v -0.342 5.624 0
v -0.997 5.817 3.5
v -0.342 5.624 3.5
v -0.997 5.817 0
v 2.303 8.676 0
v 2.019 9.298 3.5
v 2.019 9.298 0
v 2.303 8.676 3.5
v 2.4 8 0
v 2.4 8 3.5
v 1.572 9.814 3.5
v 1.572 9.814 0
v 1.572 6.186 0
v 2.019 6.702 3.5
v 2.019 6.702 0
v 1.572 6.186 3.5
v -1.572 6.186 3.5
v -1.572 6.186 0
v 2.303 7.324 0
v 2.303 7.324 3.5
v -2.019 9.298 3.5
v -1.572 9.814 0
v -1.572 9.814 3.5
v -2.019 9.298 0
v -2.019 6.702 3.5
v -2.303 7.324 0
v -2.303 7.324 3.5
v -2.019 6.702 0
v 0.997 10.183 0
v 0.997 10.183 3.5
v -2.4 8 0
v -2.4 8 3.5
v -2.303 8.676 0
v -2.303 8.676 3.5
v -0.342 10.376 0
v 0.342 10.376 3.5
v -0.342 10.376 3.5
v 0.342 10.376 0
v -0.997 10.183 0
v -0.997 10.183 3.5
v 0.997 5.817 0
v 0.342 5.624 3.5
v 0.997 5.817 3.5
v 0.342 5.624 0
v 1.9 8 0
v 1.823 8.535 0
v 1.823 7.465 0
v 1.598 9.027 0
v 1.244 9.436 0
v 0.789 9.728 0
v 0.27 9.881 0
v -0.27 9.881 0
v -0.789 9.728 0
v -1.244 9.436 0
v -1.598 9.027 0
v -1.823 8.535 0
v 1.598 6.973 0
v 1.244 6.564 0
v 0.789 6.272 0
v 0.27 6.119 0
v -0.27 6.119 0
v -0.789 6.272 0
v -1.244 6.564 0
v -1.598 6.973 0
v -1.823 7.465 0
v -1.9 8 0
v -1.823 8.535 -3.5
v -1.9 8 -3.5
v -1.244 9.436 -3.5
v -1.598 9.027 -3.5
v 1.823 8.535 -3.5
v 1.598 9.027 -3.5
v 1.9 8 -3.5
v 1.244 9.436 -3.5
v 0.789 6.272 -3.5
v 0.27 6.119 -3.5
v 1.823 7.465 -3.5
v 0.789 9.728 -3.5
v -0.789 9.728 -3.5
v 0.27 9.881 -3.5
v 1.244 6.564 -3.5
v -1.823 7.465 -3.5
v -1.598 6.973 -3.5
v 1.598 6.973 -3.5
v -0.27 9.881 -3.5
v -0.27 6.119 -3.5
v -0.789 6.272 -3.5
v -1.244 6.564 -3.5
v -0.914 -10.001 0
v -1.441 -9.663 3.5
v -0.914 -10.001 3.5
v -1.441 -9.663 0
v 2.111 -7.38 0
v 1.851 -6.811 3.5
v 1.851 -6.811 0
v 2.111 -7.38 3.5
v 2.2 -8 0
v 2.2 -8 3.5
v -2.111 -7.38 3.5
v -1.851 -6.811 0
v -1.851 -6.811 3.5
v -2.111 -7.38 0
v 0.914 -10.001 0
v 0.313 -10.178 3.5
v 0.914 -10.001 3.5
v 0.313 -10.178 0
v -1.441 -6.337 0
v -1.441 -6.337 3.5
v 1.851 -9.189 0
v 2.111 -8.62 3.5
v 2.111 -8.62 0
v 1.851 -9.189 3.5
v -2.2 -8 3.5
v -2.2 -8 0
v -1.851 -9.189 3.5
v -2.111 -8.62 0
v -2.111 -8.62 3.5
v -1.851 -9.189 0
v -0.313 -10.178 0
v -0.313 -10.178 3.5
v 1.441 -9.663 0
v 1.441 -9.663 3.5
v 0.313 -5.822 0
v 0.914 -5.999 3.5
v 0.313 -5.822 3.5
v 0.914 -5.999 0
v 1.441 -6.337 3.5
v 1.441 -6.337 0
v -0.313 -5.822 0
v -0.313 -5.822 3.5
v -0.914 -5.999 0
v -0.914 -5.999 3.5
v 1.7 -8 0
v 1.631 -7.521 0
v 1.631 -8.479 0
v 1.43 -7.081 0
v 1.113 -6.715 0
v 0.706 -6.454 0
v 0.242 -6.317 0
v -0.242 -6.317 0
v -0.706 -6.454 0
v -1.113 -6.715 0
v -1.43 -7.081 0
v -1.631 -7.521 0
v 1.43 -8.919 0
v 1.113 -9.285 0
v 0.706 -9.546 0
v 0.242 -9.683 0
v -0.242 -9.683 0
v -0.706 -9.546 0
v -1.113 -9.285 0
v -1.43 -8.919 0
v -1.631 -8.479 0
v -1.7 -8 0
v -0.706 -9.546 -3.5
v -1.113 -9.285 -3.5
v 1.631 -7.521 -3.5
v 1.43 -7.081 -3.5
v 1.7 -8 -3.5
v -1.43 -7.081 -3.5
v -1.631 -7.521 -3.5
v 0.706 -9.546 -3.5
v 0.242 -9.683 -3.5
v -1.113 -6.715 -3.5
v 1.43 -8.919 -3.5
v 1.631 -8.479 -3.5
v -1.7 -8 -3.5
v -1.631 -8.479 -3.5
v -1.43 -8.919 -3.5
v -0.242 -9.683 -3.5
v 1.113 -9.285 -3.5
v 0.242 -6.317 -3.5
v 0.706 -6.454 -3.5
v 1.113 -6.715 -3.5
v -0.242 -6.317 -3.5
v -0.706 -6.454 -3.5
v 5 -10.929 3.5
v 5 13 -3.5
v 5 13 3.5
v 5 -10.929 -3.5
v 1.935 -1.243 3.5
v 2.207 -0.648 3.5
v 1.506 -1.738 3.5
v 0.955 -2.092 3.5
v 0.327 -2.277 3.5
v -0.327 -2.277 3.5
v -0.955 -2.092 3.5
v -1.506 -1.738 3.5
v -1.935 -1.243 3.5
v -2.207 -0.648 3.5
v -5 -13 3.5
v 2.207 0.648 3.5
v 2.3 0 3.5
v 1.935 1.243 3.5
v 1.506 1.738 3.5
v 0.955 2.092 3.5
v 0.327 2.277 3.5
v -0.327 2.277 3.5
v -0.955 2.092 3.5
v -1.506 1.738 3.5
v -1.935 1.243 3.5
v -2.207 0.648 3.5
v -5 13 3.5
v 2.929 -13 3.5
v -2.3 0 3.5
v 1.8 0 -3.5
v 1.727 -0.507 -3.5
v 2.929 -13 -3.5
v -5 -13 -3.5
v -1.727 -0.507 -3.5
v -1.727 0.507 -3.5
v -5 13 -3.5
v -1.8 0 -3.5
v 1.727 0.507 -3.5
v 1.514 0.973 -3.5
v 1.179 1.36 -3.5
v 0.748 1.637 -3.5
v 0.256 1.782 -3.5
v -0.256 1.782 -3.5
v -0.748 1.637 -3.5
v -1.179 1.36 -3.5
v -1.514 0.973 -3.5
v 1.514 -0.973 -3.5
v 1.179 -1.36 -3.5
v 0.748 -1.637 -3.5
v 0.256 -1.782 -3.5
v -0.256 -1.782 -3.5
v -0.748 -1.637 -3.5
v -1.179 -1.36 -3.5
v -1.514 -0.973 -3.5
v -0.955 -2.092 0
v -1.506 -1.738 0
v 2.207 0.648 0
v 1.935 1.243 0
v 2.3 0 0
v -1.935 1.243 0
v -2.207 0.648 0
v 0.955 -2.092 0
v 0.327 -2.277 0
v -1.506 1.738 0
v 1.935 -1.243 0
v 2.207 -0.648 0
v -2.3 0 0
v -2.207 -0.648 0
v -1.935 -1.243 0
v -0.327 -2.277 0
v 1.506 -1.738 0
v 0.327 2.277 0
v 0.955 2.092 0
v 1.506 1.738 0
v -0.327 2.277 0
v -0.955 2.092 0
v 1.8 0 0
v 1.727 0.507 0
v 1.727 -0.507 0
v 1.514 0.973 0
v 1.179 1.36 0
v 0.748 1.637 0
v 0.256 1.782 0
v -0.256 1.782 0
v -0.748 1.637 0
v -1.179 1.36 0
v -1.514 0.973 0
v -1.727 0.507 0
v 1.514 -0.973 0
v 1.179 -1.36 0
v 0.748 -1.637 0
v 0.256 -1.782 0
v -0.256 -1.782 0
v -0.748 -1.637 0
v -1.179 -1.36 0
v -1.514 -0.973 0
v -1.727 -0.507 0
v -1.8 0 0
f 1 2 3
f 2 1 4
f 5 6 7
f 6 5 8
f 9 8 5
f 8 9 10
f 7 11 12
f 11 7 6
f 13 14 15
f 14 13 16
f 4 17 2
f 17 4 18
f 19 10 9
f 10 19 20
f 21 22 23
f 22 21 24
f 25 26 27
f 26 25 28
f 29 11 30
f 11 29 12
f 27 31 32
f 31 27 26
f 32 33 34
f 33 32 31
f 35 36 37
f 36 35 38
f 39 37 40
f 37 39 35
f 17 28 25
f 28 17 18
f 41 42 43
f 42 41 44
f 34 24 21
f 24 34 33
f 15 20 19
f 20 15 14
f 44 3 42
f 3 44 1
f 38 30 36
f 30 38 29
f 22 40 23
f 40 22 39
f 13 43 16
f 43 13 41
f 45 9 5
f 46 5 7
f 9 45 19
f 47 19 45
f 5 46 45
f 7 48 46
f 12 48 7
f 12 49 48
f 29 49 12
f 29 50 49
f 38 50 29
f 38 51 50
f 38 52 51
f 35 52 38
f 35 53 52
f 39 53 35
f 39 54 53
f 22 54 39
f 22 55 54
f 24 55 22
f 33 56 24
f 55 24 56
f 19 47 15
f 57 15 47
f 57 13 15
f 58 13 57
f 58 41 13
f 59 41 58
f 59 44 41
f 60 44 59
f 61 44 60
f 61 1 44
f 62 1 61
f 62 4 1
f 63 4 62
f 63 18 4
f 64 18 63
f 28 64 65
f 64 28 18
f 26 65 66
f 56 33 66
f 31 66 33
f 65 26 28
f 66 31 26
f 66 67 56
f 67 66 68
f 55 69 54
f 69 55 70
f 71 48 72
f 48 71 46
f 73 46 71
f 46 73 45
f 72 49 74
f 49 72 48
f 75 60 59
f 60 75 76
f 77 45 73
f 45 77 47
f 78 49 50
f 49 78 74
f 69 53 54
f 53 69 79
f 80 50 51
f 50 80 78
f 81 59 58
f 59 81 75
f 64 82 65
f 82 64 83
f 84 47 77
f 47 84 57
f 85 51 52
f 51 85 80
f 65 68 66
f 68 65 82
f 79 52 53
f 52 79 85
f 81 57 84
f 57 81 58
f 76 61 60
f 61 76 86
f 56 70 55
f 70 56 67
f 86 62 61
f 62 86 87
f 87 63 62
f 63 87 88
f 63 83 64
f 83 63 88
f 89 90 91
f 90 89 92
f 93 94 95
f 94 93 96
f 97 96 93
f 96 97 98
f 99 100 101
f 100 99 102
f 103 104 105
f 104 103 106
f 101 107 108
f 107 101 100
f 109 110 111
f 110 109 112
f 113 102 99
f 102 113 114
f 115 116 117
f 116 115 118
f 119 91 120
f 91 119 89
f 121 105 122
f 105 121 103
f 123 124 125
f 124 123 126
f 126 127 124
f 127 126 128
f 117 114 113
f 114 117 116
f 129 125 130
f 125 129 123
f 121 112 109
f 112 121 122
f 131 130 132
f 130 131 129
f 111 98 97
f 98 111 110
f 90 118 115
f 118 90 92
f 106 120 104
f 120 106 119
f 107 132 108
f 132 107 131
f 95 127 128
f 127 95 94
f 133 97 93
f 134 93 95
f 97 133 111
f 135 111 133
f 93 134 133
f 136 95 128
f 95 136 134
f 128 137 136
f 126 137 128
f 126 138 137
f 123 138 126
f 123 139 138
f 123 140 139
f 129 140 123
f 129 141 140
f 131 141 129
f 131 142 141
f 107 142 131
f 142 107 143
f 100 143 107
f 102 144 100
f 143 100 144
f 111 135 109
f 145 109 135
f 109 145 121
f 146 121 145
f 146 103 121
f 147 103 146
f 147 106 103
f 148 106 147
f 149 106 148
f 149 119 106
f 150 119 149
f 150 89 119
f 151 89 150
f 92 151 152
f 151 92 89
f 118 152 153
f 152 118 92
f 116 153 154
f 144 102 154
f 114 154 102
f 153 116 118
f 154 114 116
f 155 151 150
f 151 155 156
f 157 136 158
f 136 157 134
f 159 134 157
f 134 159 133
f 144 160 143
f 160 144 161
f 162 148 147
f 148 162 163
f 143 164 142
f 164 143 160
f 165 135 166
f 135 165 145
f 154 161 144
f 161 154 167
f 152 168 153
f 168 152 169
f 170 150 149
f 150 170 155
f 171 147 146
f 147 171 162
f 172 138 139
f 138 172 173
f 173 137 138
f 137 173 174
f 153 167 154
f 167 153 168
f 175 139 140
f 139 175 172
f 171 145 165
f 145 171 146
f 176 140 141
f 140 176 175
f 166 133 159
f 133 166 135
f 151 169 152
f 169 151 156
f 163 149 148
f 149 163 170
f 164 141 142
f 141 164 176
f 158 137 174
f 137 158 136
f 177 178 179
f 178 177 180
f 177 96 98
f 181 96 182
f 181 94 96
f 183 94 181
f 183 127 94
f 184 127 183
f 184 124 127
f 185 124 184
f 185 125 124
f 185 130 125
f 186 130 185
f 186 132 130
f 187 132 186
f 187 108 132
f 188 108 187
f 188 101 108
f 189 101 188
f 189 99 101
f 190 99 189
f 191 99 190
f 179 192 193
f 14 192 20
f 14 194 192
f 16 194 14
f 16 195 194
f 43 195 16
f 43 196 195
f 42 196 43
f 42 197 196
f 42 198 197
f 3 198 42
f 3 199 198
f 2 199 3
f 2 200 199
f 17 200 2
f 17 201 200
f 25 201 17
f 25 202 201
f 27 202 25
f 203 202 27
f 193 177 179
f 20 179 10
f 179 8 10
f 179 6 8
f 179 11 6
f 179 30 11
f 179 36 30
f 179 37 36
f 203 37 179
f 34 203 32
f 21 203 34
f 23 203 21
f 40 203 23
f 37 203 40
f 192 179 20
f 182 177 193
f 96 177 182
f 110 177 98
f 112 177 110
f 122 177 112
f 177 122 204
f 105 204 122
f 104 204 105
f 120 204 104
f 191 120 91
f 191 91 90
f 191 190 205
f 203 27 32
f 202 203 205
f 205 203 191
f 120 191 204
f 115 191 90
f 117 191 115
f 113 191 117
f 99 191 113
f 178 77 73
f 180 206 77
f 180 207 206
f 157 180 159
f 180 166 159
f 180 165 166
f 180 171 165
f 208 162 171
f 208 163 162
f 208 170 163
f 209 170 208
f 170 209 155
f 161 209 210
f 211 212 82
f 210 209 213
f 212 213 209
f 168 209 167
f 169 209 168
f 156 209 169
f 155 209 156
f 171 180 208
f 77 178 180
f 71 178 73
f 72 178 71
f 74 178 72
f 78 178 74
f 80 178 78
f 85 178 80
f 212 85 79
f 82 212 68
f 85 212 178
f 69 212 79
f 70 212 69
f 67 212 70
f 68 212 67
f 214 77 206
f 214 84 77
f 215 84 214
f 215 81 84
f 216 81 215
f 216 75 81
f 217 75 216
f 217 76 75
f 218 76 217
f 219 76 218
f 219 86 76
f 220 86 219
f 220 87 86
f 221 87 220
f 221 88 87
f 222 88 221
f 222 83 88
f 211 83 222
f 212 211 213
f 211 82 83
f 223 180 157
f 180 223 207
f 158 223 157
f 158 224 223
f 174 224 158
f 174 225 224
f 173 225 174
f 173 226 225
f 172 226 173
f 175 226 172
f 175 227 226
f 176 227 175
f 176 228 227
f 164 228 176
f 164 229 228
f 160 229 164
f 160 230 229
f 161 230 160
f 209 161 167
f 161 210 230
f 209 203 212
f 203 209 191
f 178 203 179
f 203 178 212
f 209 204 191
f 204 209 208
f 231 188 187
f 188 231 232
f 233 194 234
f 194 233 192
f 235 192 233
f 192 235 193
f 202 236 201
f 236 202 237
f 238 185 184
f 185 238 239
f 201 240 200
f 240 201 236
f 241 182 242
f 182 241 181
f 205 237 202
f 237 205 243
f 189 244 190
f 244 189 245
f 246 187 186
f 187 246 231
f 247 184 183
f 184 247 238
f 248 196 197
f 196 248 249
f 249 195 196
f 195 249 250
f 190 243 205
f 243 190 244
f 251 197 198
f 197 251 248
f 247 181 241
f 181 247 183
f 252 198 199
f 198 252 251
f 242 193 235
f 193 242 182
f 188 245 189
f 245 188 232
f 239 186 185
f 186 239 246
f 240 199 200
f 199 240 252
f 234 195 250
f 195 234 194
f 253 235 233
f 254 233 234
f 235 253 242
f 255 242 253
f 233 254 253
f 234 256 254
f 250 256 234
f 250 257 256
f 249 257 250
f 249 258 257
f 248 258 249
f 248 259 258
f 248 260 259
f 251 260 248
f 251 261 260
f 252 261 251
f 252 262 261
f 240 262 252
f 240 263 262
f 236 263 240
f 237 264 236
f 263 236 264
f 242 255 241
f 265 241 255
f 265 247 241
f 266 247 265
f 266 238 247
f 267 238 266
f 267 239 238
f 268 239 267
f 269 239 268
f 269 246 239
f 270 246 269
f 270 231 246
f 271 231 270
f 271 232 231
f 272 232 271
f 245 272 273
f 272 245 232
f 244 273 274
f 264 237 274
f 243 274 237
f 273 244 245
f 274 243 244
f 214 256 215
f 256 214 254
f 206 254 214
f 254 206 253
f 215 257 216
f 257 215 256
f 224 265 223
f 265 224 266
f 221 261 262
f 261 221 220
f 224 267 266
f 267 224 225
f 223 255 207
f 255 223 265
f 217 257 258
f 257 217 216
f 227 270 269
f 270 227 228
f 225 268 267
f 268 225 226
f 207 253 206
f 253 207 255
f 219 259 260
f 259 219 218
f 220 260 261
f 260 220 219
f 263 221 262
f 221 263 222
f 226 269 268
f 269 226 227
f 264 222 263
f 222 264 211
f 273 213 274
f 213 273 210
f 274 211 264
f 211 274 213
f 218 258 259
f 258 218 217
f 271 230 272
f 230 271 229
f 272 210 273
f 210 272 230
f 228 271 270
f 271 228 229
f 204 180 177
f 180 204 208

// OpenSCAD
// brassTest.scad
// test for M3 brass heat-set inserts

difference(){
cube([10,26,7],center=true);

translate([0,8,0]){
cylinder(r=2.4,h=3.5+5,$fn=22);
cylinder(r=1.9,h=3.5+5,center=true,$fn=22);
}

// THIS IS THE GOOD ONE !
cylinder(r=2.3,h=3.5+5,$fn=22);
cylinder(r=1.8,h=3.5+5,center=true,$fn=22);

translate([0,-8,0]){
cylinder(r=2.2,h=3.5+5,$fn=22);
cylinder(r=1.7,h=3.5+5,center=true,$fn=22);
}

translate([5,-18,0])
rotate([0,0,45])
cube([10,10,10],center=true);

}
